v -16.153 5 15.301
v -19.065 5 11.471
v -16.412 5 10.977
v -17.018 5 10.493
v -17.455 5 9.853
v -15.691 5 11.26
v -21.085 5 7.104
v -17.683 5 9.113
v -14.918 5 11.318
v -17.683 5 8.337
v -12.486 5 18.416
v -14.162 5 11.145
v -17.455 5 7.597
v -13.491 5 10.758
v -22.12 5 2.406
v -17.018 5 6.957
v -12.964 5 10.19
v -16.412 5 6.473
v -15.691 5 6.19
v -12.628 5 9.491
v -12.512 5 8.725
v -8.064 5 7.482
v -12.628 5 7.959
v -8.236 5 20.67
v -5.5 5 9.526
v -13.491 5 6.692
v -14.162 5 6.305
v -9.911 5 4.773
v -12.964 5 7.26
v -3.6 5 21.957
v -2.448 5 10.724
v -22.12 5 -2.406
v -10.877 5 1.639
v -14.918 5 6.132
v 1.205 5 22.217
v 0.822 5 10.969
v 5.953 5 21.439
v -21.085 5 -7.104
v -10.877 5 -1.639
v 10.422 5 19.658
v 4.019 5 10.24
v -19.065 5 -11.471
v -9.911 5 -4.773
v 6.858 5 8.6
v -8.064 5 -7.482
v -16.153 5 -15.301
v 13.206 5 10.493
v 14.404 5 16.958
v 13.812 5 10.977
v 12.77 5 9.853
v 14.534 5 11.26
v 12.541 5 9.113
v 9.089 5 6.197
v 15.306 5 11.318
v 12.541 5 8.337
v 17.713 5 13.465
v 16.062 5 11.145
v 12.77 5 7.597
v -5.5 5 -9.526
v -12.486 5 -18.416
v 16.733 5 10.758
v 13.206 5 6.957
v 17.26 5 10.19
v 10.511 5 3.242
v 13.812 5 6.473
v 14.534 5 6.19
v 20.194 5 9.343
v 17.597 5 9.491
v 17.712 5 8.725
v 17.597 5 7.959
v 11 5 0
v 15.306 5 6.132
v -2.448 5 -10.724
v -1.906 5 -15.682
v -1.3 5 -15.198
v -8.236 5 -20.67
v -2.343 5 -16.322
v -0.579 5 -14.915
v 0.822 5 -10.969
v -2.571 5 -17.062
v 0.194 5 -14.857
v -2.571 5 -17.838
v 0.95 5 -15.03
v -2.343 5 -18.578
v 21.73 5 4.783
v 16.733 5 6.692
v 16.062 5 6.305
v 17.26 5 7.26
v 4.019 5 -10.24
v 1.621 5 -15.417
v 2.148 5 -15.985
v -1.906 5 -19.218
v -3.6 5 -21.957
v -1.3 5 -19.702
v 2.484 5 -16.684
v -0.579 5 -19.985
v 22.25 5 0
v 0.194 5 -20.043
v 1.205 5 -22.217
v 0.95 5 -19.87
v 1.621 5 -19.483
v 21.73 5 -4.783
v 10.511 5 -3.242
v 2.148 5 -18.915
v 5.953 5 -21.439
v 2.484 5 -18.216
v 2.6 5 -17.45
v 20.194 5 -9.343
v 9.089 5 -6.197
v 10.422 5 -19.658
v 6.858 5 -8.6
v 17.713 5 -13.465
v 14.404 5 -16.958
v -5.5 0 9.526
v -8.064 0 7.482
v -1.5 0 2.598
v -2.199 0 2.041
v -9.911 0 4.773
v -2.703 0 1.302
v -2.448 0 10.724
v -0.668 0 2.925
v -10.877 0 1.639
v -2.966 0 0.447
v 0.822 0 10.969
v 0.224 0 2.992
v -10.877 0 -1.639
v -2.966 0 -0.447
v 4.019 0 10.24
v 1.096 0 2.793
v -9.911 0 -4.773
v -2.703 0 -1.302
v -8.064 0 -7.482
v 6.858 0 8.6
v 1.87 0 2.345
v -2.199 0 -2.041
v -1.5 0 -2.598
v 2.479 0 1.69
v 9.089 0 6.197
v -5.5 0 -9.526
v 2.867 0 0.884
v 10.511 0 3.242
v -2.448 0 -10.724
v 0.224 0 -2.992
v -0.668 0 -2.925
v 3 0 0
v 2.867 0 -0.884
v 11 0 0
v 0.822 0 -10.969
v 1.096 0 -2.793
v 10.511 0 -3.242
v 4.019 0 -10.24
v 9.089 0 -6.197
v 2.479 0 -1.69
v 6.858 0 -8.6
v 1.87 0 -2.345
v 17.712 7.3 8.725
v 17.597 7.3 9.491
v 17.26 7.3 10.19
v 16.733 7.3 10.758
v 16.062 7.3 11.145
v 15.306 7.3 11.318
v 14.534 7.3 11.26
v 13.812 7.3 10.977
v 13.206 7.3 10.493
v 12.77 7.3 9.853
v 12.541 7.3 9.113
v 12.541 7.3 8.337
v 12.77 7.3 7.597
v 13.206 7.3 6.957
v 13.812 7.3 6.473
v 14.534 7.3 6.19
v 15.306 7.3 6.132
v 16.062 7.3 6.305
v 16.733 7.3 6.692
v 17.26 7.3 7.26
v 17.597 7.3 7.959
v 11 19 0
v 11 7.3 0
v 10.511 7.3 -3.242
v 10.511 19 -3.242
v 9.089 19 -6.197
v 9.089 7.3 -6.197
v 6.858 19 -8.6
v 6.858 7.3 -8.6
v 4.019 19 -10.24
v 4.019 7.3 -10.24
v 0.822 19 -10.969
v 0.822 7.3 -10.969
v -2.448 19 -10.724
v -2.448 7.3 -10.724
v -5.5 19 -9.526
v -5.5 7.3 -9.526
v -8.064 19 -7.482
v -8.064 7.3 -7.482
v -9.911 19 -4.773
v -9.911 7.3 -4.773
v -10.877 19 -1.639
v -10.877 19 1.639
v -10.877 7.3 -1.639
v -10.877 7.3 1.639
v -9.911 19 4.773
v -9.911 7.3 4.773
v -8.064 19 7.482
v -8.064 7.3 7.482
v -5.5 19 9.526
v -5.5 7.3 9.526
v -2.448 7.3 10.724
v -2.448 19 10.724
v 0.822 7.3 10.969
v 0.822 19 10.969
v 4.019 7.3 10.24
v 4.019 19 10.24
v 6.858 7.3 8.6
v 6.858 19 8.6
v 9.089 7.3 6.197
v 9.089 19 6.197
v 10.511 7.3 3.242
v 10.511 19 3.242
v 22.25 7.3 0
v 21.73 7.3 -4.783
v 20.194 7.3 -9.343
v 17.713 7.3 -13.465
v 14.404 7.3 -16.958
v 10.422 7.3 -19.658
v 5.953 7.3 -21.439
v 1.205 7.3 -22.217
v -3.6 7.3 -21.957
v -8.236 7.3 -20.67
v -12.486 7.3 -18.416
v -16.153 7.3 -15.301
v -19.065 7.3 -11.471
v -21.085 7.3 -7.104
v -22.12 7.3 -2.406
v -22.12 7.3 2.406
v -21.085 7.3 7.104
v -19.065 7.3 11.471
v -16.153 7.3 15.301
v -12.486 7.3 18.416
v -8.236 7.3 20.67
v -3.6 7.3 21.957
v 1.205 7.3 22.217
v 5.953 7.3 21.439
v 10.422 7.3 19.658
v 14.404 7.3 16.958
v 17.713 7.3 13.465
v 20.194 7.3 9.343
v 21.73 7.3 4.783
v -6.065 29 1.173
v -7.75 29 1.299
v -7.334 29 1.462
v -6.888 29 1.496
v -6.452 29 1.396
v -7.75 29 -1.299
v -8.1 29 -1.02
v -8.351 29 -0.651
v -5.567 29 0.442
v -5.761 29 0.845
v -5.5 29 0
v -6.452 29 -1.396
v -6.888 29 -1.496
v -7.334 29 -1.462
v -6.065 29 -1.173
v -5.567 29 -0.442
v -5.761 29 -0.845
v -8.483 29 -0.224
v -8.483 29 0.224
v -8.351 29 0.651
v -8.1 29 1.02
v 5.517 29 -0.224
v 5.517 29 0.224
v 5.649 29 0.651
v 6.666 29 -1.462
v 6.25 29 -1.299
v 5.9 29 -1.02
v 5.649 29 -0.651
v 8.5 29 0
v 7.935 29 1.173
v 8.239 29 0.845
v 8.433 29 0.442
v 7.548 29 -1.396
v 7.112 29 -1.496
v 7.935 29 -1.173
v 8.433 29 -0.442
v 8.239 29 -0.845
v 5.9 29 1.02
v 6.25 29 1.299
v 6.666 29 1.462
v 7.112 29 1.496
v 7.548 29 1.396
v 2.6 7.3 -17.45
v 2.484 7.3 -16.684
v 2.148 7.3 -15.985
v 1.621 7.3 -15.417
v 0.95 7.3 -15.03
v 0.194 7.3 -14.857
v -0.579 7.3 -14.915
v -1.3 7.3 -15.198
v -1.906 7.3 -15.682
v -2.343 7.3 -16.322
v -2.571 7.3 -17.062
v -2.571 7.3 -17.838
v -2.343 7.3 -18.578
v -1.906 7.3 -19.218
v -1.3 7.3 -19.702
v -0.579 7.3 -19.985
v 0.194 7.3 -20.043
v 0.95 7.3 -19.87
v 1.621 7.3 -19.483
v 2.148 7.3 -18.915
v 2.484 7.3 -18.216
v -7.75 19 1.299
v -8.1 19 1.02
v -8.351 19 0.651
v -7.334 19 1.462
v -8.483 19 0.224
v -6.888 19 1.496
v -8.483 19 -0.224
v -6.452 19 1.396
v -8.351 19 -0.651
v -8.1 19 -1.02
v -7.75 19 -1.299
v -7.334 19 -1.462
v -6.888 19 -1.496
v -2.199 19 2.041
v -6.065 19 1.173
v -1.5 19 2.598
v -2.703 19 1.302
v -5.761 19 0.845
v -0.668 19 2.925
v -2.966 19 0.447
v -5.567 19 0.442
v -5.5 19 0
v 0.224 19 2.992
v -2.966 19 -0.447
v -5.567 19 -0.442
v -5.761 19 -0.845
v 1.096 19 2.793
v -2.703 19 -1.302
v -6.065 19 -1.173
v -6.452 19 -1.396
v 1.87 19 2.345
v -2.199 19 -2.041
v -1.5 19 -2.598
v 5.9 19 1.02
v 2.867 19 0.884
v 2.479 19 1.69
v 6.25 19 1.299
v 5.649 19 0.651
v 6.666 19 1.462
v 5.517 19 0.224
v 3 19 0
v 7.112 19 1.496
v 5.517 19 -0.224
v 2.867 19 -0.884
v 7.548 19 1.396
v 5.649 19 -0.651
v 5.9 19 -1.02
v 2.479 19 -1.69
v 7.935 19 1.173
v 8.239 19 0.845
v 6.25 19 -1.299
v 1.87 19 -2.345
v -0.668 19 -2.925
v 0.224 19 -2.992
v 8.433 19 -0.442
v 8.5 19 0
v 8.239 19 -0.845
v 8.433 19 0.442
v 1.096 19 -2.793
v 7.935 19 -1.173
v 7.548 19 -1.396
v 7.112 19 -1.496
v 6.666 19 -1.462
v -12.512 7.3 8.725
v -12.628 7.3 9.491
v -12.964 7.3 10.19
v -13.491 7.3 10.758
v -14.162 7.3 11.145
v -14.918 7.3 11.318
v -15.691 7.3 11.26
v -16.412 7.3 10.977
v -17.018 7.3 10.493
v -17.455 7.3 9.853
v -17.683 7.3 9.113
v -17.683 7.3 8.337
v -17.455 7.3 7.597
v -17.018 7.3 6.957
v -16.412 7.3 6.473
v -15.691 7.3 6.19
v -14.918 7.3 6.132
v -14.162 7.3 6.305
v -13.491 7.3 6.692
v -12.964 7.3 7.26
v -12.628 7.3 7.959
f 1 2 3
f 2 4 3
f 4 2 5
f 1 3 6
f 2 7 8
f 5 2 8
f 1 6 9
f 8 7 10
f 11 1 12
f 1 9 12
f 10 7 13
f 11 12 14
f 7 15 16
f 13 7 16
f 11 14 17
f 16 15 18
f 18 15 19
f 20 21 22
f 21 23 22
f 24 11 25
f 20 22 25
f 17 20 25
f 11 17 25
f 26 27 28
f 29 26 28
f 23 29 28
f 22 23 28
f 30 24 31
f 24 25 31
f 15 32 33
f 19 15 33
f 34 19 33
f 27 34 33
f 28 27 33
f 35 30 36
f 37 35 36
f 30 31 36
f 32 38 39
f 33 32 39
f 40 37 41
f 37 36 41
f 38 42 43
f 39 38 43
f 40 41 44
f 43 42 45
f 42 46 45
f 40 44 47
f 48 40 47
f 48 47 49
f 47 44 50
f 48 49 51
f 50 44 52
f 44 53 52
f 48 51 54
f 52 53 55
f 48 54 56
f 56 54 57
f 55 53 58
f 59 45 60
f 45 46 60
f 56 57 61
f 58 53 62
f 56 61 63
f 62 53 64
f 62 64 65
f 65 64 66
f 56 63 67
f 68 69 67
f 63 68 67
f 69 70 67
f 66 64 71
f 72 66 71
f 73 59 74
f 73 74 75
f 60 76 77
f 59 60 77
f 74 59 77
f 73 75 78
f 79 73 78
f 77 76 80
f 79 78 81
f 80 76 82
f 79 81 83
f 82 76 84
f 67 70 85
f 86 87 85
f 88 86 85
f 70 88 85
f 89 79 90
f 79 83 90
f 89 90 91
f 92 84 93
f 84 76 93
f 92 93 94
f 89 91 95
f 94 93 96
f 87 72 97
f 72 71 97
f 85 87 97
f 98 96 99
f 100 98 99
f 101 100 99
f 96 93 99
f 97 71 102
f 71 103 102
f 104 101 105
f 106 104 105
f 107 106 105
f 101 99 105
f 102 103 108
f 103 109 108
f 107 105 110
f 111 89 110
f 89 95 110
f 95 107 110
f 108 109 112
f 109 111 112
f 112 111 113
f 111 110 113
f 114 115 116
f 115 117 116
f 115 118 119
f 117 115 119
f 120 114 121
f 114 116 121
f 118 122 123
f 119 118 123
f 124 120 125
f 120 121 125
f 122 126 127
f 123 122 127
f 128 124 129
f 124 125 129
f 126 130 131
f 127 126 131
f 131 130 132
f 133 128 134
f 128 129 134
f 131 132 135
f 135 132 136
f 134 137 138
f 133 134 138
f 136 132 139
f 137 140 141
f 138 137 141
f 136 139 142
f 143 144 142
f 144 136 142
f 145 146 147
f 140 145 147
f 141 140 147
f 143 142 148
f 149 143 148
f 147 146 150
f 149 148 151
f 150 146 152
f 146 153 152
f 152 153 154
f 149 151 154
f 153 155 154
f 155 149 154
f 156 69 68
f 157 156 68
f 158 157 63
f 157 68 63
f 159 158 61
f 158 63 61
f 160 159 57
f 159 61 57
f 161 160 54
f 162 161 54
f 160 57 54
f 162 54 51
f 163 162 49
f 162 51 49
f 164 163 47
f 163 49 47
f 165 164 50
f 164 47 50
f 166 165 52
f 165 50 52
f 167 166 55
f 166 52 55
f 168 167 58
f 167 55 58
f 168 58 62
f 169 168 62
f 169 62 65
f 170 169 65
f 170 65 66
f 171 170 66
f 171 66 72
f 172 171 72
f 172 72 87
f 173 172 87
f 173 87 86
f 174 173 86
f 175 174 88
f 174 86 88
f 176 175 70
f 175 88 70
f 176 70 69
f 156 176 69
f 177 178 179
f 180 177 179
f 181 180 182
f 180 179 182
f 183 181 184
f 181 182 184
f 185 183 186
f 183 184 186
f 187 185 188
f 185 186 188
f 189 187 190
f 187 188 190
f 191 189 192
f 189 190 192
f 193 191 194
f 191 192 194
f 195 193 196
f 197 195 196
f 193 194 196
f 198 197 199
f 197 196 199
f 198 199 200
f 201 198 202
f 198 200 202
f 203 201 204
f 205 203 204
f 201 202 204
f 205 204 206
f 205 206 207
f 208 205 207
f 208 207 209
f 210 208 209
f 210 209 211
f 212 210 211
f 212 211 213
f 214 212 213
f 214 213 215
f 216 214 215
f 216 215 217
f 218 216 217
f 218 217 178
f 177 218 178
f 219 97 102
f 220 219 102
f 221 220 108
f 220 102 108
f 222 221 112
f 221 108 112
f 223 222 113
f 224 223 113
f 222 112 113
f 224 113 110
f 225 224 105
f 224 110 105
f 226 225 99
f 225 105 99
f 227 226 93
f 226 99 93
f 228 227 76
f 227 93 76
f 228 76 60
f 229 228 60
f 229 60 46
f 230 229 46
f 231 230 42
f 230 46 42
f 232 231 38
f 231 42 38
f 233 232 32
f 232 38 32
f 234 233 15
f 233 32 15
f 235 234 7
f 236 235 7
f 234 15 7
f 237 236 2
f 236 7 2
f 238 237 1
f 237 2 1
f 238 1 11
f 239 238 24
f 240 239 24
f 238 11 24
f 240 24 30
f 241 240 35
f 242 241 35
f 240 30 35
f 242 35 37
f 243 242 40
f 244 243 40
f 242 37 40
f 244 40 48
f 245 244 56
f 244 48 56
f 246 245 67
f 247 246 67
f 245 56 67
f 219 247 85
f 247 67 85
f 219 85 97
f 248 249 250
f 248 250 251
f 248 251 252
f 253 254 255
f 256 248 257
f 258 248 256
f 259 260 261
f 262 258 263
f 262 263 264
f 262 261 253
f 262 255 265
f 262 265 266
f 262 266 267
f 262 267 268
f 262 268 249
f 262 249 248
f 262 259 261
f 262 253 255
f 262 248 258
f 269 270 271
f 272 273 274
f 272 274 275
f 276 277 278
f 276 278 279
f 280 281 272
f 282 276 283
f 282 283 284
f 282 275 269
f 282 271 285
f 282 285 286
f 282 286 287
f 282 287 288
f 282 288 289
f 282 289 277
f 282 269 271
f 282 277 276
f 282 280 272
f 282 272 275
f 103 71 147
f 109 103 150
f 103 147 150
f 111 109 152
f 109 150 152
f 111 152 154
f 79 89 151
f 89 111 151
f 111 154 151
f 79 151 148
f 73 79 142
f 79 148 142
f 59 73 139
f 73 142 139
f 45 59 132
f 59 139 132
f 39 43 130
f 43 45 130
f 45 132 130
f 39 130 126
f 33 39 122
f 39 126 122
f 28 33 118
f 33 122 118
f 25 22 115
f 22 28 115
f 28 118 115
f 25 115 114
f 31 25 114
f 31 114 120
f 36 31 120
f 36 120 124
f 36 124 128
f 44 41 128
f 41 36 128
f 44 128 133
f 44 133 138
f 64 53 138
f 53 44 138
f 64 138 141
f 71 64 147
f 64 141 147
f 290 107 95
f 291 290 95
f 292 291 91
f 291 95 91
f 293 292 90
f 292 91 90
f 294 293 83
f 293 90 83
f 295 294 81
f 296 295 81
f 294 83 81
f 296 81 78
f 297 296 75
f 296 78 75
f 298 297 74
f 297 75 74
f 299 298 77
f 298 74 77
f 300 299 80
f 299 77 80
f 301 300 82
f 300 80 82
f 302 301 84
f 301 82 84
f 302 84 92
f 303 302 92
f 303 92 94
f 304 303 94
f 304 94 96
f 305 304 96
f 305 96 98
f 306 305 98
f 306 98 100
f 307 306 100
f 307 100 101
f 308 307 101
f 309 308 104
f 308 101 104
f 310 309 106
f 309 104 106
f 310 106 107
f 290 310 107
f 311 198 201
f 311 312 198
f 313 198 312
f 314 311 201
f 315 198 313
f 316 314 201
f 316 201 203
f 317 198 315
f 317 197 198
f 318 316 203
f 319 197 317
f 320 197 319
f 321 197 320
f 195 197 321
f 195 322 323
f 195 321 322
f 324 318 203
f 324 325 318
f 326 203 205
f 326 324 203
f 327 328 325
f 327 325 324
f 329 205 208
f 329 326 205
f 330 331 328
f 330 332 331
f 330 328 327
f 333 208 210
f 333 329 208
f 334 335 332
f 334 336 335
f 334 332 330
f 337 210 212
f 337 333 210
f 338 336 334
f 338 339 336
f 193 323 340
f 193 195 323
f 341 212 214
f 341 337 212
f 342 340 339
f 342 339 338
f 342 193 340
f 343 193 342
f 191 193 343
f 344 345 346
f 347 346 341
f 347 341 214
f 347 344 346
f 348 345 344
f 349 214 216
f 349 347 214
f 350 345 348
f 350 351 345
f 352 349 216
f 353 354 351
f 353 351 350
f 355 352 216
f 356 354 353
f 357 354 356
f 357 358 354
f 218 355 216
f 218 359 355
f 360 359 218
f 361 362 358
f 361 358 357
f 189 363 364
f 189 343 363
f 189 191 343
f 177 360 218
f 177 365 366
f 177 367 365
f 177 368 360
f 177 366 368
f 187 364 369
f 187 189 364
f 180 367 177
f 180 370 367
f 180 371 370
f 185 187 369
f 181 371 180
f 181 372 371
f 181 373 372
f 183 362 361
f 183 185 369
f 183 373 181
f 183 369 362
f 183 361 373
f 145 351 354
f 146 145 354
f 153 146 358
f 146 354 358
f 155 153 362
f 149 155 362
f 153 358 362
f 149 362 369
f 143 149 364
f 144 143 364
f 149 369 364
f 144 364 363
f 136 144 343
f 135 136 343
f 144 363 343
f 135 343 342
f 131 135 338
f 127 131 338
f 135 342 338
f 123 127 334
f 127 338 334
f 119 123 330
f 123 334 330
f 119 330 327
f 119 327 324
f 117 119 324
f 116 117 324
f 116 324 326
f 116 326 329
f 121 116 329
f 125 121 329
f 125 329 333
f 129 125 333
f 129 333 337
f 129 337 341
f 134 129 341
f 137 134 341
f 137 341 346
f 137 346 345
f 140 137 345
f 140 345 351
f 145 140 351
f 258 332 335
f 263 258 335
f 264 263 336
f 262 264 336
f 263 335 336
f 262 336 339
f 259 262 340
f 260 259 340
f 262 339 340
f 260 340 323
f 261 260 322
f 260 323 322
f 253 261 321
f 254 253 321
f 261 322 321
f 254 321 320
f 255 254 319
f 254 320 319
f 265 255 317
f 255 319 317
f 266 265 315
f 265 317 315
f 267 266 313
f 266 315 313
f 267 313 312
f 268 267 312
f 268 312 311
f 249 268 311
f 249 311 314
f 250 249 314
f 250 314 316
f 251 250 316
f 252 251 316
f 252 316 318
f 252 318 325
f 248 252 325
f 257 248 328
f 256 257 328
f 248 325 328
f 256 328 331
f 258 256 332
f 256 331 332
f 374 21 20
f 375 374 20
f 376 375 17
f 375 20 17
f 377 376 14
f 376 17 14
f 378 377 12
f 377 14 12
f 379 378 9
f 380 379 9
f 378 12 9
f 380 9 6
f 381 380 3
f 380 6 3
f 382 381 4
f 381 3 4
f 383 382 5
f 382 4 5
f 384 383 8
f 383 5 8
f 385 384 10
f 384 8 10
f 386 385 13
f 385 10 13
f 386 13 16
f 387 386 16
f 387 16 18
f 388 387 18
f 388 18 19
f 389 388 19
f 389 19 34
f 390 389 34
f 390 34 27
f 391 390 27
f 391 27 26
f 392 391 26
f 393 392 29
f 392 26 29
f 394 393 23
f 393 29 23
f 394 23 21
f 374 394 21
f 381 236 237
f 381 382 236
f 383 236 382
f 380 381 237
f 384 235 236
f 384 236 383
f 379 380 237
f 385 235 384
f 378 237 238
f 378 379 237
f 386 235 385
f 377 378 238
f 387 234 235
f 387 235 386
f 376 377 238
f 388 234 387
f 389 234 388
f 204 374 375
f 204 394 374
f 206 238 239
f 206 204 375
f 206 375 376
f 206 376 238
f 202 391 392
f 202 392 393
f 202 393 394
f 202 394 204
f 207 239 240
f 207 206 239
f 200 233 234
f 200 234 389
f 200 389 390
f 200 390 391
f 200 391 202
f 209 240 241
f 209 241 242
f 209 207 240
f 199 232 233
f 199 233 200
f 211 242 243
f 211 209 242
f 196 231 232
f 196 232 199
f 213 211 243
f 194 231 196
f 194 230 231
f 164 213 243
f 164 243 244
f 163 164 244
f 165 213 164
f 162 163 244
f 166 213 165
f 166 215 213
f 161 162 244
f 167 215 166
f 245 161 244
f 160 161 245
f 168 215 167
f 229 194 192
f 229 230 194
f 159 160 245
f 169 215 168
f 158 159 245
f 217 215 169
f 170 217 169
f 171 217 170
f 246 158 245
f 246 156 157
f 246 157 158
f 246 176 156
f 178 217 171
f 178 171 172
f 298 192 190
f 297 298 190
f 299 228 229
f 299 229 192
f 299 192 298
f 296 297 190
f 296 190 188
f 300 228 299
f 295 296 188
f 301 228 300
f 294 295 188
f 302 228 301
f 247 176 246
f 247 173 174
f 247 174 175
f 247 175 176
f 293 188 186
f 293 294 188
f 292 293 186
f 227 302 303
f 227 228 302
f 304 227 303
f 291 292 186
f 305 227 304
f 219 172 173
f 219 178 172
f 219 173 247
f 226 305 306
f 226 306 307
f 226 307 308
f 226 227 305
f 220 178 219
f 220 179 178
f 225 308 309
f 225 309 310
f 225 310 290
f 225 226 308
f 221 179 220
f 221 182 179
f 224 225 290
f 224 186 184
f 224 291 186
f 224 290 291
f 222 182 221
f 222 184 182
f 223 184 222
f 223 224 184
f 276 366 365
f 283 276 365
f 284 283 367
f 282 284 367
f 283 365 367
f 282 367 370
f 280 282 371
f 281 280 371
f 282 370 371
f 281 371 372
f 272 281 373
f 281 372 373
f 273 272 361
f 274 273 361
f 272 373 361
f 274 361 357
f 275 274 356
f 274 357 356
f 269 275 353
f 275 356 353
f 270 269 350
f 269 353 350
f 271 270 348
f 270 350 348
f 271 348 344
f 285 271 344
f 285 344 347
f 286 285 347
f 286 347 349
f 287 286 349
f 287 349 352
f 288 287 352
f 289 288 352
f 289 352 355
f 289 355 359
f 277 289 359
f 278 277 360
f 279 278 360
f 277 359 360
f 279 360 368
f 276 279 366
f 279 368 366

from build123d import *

# Parameters (mm, degrees)
CROQUIS1_R              = 11
SALIENTE_EXTRUIR1_DEPTH = 19
CROQUIS2_R              = 22.25
SALIENTE_EXTRUIR2_DEPTH = 2.3
CROQUIS3_R              = 2.6
CORTAR_EXTRUIR1_DEPTH   = 2.3
CROQUIS4_R              = 3
CORTAR_EXTRUIR2_DEPTH   = 27.3
CROQUIS5_R              = 1.5
SALIENTE_EXTRUIR3_DEPTH = 10


with BuildPart() as part:
    # Croquis1 → Saliente-Extruir1 (new body)
    with BuildSketch(Plane(origin=(0, 0, 0), x_dir=(1, 0, 0), z_dir=(0, 1, 0))):
        Circle(CROQUIS1_R)
    extrude(amount=SALIENTE_EXTRUIR1_DEPTH)

    # Croquis2 → Saliente-Extruir2 (add)
    with BuildSketch(Plane(origin=(0, 5, 0), x_dir=(1, 0, 0), z_dir=(0, 1, 0))):
        Circle(CROQUIS2_R)
    extrude(amount=SALIENTE_EXTRUIR2_DEPTH)

    # Croquis3 → Cortar-Extruir1 (cut)
    with BuildSketch(Plane.XZ.offset(-5)):
        with Locations((15.112143296, 8.725)):
            Circle(CROQUIS3_R)
        with Locations((-15.112143296, 8.725)):
            Circle(CROQUIS3_R)
        with Locations((0, -17.45)):
            Circle(CROQUIS3_R)
    extrude(amount=-CORTAR_EXTRUIR1_DEPTH, mode=Mode.SUBTRACT)

    # Croquis4 → Cortar-Extruir2 (cut)
    with BuildSketch(Plane(origin=(0, 19, 0), x_dir=(1, 0, 0), z_dir=(0, 1, 0))):
        Circle(CROQUIS4_R)
    extrude(amount=-CORTAR_EXTRUIR2_DEPTH, mode=Mode.SUBTRACT)

    # Croquis5 → Saliente-Extruir3 (add)
    with BuildSketch(Plane(origin=(0, 19, 0), x_dir=(1, 0, 0), z_dir=(0, 1, 0))):
        with Locations((-7, 0)):
            Circle(CROQUIS5_R)
        with Locations((7, 0)):
            Circle(CROQUIS5_R)
    extrude(amount=SALIENTE_EXTRUIR3_DEPTH)


solid = part.part
